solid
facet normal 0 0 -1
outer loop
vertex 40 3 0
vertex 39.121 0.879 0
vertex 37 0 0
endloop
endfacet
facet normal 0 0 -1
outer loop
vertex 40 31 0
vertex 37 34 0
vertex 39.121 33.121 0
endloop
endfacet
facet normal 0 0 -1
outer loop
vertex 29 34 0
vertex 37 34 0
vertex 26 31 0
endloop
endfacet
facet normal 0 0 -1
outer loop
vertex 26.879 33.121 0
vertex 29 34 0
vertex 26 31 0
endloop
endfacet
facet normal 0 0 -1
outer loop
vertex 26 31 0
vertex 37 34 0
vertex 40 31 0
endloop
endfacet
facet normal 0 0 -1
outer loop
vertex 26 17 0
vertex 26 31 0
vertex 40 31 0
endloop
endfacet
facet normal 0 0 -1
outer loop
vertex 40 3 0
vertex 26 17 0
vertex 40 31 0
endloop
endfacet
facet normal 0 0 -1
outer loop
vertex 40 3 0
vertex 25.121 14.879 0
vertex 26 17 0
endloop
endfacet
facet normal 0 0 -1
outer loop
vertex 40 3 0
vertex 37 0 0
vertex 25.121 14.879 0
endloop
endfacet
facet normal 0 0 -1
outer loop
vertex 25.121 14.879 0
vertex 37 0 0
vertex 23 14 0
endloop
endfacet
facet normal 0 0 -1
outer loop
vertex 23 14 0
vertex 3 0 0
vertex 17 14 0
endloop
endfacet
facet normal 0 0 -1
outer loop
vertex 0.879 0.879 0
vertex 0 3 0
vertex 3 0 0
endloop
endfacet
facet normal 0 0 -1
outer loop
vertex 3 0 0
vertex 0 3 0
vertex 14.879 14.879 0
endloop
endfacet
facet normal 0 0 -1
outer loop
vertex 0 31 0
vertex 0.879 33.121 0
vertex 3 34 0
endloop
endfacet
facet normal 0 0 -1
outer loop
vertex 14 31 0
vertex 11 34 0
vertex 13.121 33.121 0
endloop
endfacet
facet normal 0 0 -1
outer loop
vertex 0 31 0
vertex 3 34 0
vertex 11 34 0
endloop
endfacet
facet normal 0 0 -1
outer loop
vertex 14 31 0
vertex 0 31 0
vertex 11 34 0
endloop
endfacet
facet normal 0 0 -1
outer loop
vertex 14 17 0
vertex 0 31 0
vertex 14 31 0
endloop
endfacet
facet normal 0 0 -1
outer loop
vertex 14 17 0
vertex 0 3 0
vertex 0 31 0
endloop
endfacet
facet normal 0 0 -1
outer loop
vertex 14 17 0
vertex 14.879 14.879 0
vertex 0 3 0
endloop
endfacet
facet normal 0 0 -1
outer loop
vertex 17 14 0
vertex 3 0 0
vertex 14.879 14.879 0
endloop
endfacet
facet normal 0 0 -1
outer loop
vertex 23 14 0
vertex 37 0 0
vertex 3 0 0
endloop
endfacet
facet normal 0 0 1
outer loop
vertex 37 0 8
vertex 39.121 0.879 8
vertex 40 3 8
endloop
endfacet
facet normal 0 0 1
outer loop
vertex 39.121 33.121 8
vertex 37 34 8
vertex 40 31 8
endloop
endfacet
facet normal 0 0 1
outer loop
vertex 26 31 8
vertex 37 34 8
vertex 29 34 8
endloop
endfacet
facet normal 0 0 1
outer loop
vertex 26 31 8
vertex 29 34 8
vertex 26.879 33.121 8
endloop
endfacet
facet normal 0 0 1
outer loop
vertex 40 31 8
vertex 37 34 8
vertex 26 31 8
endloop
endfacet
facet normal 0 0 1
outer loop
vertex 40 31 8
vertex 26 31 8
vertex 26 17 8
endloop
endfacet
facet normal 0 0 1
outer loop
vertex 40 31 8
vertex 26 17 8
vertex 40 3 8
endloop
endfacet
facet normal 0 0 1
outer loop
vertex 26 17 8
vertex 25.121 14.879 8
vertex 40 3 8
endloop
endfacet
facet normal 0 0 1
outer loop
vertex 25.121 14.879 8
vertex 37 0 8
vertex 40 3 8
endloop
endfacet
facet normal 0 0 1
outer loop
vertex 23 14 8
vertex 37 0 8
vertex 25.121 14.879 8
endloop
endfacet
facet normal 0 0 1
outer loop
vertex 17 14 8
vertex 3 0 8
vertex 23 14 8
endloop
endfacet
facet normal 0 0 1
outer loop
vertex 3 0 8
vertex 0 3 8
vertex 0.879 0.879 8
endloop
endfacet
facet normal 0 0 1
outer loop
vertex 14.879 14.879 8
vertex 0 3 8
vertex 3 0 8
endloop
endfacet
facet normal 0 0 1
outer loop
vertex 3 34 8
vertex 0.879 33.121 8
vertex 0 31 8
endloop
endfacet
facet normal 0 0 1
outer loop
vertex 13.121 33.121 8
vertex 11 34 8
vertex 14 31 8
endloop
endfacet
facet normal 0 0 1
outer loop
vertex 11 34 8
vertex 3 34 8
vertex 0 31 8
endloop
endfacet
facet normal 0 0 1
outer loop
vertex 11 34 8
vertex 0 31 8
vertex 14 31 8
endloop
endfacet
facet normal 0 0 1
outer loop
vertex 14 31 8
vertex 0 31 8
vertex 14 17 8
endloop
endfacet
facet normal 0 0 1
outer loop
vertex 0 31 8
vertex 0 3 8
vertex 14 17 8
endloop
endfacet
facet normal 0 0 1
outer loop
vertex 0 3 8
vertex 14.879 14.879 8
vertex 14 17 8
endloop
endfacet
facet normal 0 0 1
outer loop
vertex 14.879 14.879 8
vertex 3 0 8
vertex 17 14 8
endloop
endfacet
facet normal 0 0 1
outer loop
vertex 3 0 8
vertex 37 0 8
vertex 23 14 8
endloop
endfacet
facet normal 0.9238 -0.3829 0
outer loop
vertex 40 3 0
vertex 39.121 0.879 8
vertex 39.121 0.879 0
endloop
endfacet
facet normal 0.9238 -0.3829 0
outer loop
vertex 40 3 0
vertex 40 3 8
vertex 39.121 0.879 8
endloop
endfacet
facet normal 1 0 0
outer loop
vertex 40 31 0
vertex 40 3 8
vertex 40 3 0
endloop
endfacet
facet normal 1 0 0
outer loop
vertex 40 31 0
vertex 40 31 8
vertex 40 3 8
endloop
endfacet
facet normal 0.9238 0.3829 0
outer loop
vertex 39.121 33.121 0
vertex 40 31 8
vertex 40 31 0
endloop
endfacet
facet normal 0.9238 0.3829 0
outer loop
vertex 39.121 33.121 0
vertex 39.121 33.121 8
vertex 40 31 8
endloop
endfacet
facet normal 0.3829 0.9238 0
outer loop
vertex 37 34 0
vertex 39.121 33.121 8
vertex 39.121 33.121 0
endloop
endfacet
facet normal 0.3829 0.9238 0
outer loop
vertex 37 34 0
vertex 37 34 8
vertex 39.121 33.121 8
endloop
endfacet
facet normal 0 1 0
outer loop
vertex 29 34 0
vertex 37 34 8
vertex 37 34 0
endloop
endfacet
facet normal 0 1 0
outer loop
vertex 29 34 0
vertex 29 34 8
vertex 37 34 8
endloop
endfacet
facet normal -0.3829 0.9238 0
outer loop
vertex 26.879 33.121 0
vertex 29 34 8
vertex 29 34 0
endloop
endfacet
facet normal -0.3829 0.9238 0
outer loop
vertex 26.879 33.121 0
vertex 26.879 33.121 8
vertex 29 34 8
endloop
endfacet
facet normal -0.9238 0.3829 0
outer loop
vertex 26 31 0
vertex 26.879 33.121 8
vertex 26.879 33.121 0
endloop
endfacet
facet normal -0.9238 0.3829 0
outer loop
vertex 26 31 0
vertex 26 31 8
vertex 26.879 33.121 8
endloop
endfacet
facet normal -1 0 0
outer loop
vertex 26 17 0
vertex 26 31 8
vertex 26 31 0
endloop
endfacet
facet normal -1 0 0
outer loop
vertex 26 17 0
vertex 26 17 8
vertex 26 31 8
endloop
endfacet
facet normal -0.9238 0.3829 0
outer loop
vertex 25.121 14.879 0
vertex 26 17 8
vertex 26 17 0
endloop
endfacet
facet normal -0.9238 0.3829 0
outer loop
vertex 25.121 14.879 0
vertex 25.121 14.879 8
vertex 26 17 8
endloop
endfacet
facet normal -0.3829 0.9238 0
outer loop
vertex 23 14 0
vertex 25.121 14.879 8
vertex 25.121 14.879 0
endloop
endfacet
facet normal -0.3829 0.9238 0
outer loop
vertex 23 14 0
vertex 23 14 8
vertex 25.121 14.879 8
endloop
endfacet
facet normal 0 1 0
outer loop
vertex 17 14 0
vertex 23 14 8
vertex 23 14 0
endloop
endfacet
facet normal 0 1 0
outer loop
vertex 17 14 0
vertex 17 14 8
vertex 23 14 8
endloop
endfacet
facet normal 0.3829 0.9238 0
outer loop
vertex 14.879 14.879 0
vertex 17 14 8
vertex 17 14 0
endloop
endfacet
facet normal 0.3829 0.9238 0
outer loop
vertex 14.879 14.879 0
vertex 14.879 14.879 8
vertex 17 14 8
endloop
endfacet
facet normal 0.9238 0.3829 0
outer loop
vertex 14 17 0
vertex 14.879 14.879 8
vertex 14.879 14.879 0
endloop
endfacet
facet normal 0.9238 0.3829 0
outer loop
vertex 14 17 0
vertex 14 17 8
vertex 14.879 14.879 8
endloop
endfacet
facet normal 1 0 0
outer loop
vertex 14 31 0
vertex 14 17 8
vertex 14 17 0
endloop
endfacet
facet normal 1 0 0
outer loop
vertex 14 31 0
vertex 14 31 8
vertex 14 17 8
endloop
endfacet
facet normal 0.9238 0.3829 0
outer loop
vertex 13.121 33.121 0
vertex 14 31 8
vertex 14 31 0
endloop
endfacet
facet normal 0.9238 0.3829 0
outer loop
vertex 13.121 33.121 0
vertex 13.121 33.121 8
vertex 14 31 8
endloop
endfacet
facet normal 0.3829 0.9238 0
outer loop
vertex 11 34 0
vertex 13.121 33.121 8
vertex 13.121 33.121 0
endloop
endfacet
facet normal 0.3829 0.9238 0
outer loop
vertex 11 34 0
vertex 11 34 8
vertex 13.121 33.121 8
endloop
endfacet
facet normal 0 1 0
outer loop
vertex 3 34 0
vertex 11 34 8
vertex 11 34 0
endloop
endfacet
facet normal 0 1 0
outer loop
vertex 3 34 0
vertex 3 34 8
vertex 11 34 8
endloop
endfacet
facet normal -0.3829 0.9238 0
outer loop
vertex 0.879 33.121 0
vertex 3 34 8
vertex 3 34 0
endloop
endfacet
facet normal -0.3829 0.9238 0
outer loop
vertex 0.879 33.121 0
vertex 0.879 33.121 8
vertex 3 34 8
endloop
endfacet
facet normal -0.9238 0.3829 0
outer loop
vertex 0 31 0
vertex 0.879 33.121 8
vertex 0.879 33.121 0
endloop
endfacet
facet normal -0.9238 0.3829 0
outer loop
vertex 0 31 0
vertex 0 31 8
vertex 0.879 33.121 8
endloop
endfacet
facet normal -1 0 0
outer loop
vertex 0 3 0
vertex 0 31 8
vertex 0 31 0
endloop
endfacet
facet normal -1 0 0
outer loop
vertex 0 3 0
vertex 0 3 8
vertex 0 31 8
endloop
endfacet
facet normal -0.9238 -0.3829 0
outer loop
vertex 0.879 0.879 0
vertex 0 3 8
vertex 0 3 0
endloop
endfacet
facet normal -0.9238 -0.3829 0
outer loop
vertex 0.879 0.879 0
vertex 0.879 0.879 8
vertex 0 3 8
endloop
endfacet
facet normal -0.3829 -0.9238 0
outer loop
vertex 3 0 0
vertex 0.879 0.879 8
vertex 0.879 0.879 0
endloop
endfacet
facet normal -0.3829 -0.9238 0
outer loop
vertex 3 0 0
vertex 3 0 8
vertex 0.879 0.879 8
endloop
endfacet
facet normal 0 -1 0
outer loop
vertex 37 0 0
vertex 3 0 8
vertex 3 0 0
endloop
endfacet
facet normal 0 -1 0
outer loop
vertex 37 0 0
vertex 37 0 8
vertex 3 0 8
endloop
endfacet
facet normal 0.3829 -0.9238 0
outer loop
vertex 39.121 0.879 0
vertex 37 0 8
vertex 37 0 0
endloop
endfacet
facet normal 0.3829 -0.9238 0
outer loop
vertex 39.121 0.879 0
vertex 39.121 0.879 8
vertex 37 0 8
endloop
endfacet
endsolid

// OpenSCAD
$fn = 32;

// ----------------------------------------------------------------------
// Eye lug: clevis, 8 mm thick
// ----------------------------------------------------------------------

// --- parameters (mm) ---
profile_height = 8;       // extrusion height
profile_points = 24;      // points of the closed outline

profile = [[0, 3], [0.879, 0.879], [3, 0], [37, 0], [39.121, 0.879], [40, 3], [40, 31], [39.121, 33.121], [37, 34], [29, 34], [26.879, 33.121], [26, 31], [26, 17], [25.121, 14.879], [23, 14], [17, 14], [14.879, 14.879], [14, 17], [14, 31], [13.121, 33.121], [11, 34], [3, 34], [0.879, 33.121], [0, 31]];  // single closed polygon, 24 points, counter clockwise

// --- the one profile operation ---
linear_extrude(height = profile_height) polygon(points = profile);
